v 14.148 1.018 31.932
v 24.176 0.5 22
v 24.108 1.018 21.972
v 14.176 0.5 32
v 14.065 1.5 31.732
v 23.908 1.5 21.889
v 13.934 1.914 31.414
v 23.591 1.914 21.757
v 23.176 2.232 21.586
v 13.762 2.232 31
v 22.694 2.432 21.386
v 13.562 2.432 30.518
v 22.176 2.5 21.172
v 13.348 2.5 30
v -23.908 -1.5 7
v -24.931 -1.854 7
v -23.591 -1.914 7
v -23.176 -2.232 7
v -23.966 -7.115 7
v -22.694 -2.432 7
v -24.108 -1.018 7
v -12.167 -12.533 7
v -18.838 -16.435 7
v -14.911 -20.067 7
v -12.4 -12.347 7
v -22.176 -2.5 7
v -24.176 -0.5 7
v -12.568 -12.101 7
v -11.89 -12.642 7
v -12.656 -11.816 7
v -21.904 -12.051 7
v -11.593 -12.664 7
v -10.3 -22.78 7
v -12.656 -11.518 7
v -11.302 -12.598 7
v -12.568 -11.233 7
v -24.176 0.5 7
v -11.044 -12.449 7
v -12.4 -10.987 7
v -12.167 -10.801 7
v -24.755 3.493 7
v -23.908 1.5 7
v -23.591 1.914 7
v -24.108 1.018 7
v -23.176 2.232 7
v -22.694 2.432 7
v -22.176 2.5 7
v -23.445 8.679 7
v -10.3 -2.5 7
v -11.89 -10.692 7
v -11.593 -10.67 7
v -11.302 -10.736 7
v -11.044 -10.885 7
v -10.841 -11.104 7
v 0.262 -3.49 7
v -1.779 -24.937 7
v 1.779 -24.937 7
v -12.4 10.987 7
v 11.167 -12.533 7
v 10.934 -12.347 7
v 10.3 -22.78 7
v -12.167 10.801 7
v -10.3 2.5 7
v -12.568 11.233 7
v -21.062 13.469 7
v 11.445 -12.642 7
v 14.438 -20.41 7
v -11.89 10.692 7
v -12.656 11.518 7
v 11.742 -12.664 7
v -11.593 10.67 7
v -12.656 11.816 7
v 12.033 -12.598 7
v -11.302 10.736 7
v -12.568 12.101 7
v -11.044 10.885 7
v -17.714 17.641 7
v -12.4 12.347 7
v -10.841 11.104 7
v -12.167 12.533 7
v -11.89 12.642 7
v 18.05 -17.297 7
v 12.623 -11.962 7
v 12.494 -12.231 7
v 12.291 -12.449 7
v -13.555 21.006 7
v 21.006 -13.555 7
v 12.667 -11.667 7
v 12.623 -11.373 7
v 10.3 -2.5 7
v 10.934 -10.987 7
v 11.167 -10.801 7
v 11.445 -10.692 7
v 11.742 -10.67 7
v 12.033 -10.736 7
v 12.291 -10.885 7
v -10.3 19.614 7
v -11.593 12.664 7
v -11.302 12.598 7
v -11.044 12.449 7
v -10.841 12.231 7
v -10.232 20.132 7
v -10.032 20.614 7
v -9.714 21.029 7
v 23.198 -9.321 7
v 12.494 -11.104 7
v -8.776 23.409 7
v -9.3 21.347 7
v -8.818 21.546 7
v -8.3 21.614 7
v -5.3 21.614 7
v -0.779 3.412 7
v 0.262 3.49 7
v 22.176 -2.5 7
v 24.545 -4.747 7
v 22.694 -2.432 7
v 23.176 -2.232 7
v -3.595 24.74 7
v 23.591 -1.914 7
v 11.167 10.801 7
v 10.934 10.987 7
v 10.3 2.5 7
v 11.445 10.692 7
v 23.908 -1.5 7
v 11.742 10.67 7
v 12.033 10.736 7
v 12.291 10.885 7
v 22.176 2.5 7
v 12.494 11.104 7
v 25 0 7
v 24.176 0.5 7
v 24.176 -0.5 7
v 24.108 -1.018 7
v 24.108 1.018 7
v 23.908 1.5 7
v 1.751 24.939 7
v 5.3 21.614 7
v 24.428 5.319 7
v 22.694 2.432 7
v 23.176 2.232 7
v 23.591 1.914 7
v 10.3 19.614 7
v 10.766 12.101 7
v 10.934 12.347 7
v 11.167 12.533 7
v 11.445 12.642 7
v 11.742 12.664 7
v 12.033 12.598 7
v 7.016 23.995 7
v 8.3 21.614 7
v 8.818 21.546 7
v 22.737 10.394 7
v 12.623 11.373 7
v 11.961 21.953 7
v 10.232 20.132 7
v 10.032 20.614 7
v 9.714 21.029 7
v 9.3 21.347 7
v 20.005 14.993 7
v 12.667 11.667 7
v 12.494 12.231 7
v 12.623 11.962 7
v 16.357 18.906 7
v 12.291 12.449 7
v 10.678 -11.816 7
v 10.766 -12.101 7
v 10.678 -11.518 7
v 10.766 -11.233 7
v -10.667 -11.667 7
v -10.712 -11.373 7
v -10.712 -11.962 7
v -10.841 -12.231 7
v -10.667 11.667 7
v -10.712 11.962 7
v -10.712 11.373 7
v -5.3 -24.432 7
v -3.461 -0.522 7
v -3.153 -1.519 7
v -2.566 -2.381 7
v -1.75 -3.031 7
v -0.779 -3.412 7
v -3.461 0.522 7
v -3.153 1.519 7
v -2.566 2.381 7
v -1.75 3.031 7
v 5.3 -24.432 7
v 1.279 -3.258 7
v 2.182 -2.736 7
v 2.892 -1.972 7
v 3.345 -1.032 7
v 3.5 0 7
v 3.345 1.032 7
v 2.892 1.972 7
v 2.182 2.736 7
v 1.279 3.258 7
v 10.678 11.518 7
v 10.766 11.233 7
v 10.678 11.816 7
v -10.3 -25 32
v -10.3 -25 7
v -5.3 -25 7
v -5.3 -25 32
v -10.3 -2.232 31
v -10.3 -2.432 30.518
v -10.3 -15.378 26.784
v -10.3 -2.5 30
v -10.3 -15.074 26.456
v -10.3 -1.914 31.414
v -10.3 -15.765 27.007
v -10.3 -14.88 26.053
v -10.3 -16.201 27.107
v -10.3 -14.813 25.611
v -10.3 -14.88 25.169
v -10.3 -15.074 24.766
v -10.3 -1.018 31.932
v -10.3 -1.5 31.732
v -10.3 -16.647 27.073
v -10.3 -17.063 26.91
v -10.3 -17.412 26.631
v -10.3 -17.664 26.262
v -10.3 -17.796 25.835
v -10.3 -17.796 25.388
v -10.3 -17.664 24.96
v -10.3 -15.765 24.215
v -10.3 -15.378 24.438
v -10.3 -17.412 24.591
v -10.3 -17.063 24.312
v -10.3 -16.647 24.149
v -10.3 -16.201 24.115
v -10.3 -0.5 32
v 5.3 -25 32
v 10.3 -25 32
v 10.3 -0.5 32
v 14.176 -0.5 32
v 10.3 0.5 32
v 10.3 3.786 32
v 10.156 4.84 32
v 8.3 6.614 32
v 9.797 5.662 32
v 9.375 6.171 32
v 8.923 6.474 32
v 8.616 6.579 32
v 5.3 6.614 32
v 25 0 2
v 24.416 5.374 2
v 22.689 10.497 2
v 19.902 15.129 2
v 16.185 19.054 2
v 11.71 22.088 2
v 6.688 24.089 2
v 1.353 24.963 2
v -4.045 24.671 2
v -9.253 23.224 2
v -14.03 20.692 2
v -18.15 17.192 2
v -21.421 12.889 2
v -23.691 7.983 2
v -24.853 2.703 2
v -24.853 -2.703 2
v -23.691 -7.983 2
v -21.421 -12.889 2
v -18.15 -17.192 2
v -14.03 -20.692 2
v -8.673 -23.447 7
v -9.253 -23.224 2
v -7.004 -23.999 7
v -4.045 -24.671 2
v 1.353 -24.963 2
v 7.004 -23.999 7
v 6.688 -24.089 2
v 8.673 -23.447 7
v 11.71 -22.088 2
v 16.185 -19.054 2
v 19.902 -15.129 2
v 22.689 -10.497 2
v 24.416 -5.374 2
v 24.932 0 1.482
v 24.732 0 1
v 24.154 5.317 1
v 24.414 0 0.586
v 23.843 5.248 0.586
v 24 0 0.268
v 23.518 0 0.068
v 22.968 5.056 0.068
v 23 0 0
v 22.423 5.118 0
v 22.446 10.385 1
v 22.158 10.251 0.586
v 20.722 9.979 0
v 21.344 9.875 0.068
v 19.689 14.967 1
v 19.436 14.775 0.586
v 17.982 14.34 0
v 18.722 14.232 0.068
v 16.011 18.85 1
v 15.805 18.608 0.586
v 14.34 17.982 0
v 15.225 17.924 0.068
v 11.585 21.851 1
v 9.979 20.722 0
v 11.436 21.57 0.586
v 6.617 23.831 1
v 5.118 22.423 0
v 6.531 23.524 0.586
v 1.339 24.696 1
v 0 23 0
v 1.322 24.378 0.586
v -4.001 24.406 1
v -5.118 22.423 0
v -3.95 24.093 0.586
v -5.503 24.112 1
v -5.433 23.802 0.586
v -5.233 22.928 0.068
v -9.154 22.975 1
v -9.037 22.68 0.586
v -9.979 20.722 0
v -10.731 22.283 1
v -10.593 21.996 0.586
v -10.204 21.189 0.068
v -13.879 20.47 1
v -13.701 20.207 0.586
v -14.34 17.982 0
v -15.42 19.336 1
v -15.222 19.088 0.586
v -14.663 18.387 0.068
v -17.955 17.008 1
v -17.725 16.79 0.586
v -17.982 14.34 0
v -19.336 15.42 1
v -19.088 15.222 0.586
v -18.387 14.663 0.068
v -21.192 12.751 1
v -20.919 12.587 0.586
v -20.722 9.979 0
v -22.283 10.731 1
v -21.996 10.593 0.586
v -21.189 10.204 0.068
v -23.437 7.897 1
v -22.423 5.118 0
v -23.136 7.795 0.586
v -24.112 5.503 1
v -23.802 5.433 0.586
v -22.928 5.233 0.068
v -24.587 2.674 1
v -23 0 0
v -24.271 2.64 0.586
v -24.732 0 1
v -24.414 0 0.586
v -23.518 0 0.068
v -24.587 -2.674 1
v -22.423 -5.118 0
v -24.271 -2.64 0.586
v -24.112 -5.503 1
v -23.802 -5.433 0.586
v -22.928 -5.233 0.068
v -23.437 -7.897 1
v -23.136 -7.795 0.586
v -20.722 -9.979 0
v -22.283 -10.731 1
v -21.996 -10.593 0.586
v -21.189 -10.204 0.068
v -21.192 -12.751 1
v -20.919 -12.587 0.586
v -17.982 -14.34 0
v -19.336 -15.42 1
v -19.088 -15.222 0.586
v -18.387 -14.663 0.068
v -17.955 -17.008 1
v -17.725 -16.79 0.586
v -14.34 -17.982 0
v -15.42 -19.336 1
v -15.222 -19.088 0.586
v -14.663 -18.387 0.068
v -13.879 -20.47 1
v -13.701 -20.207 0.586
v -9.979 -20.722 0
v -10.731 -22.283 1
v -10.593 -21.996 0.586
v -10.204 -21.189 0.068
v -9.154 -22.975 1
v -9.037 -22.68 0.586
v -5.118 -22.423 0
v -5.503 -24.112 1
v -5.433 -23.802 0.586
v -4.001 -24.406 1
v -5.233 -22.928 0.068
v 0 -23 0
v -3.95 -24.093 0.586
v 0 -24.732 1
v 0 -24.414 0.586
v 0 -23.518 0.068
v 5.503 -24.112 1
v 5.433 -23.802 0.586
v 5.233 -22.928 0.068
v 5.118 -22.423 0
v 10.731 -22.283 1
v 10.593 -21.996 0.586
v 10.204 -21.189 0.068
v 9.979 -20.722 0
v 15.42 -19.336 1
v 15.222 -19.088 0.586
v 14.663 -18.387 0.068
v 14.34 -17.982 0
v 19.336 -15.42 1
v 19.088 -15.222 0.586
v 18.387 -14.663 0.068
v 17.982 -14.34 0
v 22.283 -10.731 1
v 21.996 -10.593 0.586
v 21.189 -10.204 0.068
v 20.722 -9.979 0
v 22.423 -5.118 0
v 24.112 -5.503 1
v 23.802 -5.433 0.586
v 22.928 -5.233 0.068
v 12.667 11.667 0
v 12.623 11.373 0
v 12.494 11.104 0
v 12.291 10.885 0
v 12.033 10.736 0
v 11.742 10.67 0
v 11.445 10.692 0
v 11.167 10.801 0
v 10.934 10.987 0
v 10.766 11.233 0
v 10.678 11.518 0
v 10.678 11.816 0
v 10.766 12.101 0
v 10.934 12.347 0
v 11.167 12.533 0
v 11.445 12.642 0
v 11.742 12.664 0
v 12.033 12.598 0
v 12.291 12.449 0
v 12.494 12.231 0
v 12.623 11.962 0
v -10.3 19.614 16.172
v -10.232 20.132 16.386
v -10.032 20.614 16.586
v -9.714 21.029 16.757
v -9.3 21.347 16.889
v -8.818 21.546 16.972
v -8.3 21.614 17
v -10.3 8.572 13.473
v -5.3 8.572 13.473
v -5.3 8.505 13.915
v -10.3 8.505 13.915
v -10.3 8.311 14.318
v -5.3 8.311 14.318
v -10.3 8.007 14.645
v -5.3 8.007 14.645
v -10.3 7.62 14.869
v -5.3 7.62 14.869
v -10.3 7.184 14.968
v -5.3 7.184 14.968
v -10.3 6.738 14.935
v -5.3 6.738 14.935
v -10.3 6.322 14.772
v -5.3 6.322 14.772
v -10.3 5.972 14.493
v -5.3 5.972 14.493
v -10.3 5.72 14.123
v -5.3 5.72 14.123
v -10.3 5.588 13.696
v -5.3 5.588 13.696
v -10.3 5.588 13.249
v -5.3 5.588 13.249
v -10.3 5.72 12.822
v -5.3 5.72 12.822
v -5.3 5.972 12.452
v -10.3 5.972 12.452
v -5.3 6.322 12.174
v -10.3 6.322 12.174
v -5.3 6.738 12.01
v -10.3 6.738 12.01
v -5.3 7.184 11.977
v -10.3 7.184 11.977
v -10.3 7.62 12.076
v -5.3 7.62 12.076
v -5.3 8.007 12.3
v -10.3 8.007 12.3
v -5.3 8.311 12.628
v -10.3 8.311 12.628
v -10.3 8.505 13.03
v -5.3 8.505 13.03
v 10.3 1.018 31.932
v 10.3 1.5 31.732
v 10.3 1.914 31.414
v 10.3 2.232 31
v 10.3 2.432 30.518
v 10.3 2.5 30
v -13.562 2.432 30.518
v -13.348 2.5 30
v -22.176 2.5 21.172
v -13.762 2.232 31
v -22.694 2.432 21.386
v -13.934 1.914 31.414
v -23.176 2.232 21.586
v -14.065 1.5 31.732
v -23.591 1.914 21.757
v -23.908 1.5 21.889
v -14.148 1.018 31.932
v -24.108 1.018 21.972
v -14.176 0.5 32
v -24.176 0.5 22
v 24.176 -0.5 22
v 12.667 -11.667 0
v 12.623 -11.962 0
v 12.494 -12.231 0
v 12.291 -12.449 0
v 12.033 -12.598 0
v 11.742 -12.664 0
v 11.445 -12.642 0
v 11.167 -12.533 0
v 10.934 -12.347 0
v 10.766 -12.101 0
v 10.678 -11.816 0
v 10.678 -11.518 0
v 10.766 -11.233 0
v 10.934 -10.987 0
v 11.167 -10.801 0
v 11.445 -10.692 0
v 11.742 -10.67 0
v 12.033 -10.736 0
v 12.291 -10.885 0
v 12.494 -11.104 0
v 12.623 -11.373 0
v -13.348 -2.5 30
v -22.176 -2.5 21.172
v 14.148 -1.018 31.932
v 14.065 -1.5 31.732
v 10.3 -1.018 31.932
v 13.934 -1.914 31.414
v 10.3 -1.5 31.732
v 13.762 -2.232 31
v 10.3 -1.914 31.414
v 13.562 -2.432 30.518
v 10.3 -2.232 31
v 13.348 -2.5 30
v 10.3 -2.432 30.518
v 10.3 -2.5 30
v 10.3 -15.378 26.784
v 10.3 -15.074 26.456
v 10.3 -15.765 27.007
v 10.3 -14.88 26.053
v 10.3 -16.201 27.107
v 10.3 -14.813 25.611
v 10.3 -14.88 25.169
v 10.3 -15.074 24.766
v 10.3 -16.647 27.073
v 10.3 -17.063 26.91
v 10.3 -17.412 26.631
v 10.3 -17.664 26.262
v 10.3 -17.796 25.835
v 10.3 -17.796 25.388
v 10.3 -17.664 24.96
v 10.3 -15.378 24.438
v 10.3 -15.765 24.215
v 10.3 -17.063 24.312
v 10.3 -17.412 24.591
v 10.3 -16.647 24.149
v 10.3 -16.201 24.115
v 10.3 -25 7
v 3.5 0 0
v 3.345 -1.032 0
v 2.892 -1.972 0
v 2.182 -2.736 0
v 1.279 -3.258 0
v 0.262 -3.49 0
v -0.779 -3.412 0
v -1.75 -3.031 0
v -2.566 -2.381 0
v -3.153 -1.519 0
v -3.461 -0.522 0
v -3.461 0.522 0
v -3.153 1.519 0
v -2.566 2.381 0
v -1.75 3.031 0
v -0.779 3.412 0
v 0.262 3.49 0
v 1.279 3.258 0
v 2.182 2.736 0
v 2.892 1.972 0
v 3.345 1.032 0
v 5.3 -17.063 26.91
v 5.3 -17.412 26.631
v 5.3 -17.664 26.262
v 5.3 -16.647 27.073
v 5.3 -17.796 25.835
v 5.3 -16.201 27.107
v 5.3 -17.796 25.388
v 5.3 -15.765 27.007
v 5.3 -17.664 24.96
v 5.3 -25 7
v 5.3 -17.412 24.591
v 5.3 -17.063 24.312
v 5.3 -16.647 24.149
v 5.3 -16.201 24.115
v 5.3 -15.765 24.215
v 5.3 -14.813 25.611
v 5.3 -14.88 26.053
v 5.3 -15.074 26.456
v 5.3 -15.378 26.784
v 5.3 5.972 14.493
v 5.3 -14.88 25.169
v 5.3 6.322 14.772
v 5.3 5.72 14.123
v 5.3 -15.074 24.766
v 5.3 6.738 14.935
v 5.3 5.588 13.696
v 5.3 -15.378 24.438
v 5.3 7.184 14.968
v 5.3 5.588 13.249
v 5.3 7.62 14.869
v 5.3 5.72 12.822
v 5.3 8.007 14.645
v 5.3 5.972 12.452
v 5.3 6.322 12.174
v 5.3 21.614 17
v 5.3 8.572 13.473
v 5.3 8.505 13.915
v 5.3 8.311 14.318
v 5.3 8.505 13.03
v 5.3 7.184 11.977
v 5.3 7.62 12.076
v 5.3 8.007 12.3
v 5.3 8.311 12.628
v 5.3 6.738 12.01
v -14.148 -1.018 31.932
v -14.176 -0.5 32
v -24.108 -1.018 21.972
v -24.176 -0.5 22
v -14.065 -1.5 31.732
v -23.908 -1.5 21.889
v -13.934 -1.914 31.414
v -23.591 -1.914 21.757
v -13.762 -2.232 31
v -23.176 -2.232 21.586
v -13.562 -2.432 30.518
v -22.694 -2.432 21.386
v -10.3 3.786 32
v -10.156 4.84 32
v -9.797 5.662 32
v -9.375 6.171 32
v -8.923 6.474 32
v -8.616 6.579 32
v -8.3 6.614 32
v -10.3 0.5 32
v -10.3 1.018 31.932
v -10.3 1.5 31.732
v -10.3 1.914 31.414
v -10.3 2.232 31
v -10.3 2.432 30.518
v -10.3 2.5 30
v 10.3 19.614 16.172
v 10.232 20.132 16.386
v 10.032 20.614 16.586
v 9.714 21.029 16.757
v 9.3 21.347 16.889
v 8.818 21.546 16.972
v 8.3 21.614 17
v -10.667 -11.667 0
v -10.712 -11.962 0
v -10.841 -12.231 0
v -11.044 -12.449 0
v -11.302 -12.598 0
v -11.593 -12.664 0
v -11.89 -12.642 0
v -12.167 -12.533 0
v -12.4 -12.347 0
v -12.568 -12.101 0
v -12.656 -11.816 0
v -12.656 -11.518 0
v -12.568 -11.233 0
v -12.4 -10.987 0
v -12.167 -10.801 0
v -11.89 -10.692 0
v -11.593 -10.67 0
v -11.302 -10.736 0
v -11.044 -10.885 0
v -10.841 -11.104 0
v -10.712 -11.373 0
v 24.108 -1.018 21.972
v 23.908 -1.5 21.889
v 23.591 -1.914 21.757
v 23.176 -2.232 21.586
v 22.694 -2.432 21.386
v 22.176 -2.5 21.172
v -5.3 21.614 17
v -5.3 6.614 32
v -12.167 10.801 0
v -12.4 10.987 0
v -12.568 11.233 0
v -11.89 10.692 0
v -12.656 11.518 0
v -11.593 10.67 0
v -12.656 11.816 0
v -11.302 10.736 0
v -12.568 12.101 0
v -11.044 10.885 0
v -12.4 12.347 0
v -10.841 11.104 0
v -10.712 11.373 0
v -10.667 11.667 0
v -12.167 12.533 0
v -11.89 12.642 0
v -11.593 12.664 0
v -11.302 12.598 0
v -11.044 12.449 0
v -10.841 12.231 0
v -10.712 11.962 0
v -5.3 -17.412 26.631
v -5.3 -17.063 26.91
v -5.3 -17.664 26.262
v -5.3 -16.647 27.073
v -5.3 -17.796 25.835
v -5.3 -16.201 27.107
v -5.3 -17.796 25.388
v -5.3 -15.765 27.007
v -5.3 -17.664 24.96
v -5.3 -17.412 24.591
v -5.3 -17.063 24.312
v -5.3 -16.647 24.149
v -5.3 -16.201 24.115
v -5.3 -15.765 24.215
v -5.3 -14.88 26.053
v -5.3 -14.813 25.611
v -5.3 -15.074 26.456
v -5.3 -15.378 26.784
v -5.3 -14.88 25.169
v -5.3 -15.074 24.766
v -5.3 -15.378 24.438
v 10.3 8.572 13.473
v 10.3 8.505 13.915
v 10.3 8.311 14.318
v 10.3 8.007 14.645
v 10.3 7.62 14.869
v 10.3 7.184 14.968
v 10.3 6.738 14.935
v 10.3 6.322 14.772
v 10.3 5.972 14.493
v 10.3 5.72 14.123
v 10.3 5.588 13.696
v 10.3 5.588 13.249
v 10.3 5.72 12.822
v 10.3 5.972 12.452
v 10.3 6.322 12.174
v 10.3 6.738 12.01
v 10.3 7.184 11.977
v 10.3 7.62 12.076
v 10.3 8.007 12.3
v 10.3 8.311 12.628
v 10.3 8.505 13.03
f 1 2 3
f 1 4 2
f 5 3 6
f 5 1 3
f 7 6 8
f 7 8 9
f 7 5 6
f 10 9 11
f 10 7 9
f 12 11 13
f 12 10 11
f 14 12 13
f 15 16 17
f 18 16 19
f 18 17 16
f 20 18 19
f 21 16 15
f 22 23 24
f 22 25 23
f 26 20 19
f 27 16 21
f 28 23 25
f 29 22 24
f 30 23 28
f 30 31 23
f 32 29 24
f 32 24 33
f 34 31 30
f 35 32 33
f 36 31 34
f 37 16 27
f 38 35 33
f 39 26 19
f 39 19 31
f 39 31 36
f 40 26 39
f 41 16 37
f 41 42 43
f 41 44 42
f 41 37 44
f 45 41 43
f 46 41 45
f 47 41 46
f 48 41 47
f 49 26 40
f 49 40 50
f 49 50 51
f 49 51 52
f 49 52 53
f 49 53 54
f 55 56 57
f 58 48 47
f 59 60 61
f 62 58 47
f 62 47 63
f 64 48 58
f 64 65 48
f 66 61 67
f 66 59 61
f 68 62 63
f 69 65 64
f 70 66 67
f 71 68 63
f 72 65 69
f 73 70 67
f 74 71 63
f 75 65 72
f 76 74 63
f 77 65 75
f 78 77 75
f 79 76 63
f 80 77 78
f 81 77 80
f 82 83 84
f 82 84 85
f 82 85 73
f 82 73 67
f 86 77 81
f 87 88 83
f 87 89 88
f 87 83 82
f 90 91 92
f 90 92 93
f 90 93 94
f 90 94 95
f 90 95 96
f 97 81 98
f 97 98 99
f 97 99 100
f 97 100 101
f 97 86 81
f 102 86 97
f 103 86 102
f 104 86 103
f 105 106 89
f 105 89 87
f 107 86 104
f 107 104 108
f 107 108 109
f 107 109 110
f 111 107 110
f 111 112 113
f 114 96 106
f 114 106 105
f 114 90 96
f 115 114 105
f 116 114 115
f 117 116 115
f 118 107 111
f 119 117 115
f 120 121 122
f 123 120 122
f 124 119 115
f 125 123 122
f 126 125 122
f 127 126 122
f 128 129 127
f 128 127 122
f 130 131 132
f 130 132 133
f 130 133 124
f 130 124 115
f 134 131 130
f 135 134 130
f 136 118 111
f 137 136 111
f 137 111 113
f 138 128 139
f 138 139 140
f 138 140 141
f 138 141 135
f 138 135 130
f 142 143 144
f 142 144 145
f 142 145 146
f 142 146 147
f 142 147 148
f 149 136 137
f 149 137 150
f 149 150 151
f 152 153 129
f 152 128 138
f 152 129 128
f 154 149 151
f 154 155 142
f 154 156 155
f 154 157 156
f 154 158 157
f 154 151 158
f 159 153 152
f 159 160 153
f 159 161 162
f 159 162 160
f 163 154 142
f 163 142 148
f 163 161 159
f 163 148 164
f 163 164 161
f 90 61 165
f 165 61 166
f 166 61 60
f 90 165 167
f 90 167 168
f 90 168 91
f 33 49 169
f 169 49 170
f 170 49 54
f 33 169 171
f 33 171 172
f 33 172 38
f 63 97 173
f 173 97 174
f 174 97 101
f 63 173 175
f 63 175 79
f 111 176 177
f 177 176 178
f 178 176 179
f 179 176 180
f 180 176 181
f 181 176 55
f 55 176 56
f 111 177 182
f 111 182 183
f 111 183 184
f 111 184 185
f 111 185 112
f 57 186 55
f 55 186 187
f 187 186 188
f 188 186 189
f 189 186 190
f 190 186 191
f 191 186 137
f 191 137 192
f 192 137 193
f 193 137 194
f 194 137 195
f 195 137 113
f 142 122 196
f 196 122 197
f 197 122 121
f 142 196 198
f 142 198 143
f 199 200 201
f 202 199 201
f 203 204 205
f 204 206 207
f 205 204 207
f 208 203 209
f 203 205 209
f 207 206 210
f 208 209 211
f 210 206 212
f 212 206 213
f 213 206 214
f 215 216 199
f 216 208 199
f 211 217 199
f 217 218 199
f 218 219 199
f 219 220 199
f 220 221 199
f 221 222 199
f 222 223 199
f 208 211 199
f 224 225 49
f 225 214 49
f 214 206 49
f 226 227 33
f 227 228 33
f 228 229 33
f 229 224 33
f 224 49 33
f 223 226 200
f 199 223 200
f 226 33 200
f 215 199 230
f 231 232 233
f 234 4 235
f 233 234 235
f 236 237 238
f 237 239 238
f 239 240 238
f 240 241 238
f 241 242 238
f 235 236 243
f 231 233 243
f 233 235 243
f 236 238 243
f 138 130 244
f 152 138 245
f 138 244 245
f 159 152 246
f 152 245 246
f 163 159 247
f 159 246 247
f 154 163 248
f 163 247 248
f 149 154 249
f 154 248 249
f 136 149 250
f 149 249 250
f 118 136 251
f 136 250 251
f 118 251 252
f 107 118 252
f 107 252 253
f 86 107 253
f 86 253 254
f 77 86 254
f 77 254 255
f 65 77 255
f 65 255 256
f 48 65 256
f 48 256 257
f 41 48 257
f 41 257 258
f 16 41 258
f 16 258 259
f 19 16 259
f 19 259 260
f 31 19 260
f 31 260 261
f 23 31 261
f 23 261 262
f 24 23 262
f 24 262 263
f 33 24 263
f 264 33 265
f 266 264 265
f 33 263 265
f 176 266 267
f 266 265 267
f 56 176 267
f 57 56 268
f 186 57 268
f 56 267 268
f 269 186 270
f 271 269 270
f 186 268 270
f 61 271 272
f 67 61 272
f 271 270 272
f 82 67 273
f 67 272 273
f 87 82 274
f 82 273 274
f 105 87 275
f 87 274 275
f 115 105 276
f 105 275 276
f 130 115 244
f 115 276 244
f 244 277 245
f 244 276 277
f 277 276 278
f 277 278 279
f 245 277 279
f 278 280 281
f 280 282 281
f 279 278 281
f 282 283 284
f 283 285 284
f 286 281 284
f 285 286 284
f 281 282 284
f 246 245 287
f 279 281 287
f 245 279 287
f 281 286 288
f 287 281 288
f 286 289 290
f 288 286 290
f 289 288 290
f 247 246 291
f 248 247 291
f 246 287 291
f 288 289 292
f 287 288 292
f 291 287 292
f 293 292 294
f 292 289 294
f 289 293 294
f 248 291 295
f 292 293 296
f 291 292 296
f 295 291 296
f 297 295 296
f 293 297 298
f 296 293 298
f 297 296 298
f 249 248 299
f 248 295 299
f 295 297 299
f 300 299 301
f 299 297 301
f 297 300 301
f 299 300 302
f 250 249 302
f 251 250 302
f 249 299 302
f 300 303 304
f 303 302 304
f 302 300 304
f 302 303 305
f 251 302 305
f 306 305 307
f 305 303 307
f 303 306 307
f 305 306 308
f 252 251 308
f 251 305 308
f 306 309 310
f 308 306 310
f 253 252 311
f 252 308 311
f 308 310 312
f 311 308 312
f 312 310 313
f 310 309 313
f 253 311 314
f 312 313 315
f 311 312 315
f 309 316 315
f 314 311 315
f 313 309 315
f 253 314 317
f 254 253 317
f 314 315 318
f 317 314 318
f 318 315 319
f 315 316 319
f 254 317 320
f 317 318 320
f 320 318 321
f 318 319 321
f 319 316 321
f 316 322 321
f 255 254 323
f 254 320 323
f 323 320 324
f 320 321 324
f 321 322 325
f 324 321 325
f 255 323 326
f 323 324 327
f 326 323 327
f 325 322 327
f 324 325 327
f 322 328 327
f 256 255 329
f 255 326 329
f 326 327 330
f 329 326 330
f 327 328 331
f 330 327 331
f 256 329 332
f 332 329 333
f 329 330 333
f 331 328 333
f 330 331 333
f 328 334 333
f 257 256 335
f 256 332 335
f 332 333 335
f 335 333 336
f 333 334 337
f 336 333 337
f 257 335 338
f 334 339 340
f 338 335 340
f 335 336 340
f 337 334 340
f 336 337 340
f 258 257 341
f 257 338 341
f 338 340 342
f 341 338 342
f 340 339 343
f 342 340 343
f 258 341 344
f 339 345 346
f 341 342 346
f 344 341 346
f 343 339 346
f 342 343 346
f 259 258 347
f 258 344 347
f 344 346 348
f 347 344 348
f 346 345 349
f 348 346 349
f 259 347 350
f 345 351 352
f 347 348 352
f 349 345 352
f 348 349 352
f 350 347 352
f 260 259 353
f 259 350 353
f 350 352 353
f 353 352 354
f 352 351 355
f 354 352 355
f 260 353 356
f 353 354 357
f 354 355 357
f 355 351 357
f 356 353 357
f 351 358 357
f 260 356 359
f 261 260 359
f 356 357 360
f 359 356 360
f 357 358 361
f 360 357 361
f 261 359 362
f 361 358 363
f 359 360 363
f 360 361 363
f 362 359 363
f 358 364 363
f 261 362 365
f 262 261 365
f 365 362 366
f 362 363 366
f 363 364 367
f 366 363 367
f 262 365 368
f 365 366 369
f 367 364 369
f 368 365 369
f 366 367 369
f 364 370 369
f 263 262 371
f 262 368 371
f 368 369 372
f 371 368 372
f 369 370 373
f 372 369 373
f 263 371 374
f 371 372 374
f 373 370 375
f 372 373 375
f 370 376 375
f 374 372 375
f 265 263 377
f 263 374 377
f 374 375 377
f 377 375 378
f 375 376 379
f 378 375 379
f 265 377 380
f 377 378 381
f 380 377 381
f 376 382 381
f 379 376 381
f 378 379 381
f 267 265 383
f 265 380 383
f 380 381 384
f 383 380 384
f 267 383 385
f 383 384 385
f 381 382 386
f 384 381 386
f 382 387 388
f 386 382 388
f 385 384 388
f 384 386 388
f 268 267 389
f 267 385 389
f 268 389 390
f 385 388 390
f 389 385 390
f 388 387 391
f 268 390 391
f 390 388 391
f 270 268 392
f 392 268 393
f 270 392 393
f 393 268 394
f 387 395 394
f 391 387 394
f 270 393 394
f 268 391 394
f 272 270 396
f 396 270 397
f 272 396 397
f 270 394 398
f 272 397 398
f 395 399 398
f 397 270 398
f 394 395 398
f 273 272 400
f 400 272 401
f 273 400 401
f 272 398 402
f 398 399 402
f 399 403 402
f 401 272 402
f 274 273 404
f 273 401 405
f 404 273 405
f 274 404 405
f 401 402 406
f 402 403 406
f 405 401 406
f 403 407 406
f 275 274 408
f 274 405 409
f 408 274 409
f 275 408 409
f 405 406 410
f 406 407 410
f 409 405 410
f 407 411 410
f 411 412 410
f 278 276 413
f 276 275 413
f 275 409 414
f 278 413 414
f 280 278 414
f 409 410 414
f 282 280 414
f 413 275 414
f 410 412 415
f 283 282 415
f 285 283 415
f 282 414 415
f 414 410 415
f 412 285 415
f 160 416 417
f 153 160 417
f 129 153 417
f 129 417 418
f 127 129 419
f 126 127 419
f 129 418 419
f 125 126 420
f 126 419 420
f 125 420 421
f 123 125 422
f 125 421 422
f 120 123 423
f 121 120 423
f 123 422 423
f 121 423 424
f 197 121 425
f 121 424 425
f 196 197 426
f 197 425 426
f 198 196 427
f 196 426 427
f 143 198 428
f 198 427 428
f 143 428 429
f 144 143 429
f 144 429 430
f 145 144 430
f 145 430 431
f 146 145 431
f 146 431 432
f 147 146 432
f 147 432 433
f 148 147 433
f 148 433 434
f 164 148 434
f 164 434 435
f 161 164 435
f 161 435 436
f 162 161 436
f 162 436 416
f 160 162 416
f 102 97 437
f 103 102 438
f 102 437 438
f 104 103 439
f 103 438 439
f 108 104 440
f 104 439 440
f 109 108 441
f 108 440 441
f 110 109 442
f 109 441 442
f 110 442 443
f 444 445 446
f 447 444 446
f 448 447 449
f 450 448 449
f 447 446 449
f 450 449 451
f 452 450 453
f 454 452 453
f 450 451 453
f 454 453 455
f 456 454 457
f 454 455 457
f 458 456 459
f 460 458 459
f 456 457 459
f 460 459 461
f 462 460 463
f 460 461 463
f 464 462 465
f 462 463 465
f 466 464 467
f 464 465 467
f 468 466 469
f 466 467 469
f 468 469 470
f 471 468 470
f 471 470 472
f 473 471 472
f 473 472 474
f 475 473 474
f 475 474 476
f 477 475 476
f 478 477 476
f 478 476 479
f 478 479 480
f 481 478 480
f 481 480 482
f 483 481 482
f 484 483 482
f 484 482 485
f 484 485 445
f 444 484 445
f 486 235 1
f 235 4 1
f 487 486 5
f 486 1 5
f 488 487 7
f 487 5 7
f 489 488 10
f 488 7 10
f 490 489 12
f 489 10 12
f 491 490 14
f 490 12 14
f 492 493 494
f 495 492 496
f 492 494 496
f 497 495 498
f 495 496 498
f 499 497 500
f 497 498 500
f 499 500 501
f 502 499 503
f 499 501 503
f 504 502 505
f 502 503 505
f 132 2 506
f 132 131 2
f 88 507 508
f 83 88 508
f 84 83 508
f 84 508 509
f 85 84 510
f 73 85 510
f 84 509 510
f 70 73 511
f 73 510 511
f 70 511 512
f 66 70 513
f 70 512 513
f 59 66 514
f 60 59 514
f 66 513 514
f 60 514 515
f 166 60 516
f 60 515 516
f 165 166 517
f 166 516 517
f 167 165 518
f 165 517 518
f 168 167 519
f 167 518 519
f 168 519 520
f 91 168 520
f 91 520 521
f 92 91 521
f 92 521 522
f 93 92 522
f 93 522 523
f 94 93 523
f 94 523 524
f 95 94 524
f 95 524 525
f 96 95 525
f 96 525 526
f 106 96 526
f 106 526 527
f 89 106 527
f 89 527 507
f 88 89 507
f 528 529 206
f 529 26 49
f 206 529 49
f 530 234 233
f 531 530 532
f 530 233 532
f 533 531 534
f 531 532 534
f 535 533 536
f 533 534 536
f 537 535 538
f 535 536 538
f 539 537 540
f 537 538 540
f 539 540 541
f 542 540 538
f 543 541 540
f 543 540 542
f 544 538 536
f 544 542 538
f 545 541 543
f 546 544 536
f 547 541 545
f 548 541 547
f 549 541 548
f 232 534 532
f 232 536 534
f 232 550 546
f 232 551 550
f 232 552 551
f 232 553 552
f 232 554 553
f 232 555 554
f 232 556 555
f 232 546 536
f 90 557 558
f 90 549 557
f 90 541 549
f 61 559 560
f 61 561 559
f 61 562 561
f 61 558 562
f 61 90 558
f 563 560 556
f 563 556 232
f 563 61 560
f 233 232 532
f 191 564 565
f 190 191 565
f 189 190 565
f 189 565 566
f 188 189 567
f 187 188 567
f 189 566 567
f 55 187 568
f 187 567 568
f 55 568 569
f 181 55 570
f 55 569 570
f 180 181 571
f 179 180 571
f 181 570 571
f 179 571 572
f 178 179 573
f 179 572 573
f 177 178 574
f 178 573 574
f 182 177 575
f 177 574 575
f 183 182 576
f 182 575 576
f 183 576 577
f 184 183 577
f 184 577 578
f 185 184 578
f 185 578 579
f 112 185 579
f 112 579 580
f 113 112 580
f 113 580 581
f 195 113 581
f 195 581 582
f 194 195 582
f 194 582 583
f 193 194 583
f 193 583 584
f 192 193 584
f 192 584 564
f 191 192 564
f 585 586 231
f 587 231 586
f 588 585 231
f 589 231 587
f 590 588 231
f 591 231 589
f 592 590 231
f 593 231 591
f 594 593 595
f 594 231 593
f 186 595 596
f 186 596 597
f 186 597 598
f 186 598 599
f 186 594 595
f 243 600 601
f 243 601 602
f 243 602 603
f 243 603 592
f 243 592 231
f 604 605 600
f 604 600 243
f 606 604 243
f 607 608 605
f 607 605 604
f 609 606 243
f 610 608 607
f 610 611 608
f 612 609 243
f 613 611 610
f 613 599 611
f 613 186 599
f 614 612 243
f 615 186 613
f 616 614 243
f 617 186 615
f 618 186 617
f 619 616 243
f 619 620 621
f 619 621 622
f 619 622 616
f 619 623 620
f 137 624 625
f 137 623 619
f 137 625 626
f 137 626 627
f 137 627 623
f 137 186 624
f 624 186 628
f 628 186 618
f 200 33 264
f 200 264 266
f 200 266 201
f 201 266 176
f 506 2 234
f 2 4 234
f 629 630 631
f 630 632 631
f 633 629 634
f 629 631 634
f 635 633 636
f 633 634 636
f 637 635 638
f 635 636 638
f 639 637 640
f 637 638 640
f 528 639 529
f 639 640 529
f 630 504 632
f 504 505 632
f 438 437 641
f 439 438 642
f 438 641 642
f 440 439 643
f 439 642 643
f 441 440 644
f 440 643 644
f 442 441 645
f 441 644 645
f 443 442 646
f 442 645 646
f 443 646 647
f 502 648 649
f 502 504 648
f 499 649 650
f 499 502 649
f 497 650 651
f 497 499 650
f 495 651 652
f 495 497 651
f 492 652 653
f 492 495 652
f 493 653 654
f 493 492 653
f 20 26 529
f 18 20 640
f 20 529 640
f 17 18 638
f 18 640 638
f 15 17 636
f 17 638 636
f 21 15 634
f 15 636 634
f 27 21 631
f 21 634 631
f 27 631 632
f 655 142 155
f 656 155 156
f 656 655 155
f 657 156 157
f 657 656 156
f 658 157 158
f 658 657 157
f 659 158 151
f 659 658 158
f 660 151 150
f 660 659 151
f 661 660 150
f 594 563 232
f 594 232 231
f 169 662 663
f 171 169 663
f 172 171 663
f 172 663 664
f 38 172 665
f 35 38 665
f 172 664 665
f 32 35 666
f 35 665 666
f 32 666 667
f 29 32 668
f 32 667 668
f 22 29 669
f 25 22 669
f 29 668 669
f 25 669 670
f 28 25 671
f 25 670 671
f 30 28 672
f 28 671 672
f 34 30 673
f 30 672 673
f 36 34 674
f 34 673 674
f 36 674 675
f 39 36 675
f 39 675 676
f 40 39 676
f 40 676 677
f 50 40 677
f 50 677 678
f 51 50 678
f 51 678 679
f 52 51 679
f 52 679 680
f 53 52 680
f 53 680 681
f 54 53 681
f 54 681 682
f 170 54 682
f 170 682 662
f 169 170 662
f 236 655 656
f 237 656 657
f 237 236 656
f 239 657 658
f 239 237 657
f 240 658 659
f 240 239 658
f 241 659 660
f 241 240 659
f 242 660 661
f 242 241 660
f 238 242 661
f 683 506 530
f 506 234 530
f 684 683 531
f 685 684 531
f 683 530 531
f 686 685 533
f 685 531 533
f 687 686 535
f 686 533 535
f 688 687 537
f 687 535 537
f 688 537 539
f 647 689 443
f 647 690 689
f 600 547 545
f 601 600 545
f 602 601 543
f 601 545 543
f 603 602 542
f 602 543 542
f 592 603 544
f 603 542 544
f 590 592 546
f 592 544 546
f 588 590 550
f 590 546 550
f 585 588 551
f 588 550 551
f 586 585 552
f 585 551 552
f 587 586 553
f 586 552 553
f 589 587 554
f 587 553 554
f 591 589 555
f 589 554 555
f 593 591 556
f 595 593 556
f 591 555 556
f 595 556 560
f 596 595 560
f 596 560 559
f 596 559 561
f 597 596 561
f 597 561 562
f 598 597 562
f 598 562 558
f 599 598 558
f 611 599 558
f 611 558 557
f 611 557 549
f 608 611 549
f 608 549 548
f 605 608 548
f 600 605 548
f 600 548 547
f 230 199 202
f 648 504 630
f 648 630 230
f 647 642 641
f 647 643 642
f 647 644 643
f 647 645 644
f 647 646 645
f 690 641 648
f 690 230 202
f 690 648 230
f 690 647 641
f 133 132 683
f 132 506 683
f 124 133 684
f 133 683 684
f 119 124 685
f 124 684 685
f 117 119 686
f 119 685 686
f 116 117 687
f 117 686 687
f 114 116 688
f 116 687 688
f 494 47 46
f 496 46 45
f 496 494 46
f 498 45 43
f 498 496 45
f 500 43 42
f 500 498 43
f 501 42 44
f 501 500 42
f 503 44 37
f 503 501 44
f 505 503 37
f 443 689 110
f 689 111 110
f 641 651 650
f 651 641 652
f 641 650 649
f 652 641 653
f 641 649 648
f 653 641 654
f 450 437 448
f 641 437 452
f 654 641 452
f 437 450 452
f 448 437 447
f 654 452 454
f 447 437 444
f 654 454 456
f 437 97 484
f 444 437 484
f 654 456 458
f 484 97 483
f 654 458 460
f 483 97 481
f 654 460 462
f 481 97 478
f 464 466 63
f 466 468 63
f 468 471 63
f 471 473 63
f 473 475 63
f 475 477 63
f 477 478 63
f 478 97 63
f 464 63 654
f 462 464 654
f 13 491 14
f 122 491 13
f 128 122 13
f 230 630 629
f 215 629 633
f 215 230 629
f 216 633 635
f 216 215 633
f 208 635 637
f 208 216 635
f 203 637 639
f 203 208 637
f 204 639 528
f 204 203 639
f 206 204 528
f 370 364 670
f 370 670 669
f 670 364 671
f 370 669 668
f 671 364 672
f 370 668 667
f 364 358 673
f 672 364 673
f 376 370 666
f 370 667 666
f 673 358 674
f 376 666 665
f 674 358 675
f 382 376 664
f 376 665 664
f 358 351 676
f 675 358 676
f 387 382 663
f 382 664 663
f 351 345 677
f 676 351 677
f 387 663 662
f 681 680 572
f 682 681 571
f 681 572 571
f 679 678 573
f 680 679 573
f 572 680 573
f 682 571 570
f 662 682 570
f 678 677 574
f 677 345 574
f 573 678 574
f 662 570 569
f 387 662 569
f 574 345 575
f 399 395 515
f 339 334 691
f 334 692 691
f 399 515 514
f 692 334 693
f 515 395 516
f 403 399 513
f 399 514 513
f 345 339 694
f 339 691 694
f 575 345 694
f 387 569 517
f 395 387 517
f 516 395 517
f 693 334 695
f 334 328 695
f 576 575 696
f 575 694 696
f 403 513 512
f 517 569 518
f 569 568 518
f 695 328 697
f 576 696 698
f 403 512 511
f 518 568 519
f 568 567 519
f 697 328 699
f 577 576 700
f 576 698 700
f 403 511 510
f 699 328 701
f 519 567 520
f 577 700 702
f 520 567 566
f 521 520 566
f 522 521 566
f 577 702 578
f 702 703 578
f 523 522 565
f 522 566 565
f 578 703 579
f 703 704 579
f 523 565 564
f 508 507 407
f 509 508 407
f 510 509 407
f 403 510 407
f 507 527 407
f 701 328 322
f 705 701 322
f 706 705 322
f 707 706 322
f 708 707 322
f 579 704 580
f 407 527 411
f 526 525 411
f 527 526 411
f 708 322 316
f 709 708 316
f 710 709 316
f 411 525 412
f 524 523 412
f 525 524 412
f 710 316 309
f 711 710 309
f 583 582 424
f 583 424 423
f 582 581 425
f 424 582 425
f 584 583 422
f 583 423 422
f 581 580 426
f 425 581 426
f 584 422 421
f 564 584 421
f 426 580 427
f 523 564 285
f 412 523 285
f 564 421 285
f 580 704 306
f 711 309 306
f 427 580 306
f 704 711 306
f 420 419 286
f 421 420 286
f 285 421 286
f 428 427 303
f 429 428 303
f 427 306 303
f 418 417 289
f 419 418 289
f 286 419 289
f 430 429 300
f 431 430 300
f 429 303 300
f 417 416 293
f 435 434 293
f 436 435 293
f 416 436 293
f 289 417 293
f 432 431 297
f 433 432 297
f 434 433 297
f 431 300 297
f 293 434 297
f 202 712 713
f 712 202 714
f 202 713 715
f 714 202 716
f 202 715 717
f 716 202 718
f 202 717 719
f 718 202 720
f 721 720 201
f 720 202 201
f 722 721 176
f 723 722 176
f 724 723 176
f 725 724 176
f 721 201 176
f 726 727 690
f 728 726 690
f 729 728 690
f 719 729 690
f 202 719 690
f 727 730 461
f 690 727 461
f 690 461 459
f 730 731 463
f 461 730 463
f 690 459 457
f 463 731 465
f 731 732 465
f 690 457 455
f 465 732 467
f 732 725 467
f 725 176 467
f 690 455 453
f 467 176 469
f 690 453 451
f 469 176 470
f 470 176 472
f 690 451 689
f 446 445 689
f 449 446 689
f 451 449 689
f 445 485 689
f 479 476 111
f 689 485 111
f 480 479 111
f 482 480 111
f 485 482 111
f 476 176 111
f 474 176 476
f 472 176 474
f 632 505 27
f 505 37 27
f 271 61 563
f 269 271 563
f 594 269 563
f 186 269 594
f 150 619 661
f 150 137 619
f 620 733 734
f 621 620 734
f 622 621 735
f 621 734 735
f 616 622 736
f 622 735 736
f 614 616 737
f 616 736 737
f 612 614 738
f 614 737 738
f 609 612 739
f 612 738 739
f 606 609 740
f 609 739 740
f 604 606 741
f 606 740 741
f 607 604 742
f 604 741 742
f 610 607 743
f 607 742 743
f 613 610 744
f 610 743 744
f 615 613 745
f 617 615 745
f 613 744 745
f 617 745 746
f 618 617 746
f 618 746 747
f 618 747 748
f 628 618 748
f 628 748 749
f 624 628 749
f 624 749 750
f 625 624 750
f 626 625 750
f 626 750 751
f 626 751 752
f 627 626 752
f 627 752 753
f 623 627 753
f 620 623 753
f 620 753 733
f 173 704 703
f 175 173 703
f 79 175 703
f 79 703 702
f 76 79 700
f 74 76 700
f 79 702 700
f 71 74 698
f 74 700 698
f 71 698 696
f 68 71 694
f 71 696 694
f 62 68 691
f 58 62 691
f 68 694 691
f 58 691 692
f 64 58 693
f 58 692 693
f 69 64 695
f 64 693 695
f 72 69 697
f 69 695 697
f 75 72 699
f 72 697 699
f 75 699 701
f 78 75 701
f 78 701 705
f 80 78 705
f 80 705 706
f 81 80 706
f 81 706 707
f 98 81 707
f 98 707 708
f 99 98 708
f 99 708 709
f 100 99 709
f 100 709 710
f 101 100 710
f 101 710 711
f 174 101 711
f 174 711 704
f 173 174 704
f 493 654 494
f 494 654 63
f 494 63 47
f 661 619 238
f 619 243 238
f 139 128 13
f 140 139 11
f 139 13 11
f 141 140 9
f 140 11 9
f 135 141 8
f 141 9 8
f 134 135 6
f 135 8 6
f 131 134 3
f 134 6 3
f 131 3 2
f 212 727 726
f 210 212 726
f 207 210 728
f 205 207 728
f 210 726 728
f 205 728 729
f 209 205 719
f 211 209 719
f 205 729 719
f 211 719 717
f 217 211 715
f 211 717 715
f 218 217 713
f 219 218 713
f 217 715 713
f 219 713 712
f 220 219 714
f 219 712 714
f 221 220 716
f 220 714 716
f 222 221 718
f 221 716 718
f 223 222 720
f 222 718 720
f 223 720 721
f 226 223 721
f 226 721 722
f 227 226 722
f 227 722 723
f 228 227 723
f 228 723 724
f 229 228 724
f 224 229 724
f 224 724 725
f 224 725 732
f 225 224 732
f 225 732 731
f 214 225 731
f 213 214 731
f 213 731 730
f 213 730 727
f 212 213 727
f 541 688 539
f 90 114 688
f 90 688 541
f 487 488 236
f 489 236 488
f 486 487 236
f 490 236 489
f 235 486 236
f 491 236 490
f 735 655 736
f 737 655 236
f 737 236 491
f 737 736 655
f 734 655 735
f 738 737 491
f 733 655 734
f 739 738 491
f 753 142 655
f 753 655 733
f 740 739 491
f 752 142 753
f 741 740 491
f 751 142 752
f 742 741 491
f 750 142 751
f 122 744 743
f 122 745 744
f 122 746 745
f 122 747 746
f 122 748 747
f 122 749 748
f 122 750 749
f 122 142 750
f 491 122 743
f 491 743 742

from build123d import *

# Parameters (mm, degrees)
SKETCH_R        = 25
PAD_DEPTH       = 7
PAD001_DEPTH    = 25
CHAMFER_SIZE    = 15
CHAMFER001_SIZE = 10
FILLET_R        = 2
FILLET001_R     = 2
FILLET002_R     = 2
SKETCH002_R     = 1.5
POCKET_DEPTH    = 35.301
FILLET003_R     = 2
SKETCH003_R     = 1
POCKET001_DEPTH = 32.001
SKETCH004_R     = 3.5
POCKET002_DEPTH = 32.001


with BuildPart() as part:
    # Sketch → Pad (new body)
    with BuildSketch(Plane.XY):
        Circle(SKETCH_R)
    extrude(amount=PAD_DEPTH)

    # Sketch001 → Pad001 (new body)
    with BuildSketch(Plane.XY.offset(7)):
        Polygon((5.3, 21.614464), (10.3, 21.614464), (10.3, 2.5), (24.176399, 2.5), (24.176399, -2.5), (10.3, -2.5), (10.3, -25), (5.3, -25), align=None)
    pad001 = extrude(amount=PAD001_DEPTH)

    # Mirrored: Pad001 across Sketch001 V_Axis
    add(pad001.mirror(Plane(origin=(0, 0, 7), x_dir=(0, 0, 1), z_dir=(1, 0, 0))))

    # Chamfer
    chamfer_edges = [part.edges().sort_by_distance(p)[0] for p in [
        (7.8, 21.614464, 32),
        (-7.8, 21.614464, 32),
    ]]
    chamfer(chamfer_edges, length=CHAMFER_SIZE)

    # Chamfer001
    chamfer001_edges = [part.edges().sort_by_distance(p)[0] for p in [
        (24.176399, 0, 32),
        (-24.176399, 0, 32),
    ]]
    chamfer(chamfer001_edges, length=CHAMFER001_SIZE)

    # Fillet
    fillet_edges = [part.edges().sort_by_distance(p)[0] for p in [
        (10.3, 14.114464, 24.5),
        (10.3, 21.614464, 12),
        (-10.3, 14.114464, 24.5),
        (-10.3, 21.614464, 12),
    ]]
    fillet(fillet_edges, radius=FILLET_R)

    # Fillet001
    fillet001_edges = [part.edges().sort_by_distance(p)[0] for p in [
        (-19.176399, 2.5, 27),
        (-24.176399, 2.5, 14.5),
        (-19.176399, -2.5, 27),
        (-24.176399, -2.5, 14.5),
        (-12.2382, 2.5, 32),
        (-12.2382, -2.5, 32),
    ]]
    fillet(fillet001_edges, radius=FILLET001_R)

    # Fillet002
    fillet002_edges = [part.edges().sort_by_distance(p)[0] for p in [
        (12.2382, 2.5, 32),
        (19.176399, 2.5, 27),
        (24.176399, 2.5, 14.5),
        (24.176399, -2.5, 14.5),
        (19.176399, -2.5, 27),
        (12.2382, -2.5, 32),
    ]]
    fillet(fillet002_edges, radius=FILLET002_R)

    # Sketch002 → Pocket (cut, through all)
    with BuildSketch(Plane.YZ.offset(10.3)):
        with Locations((7.071707, 13.472552)):
            Circle(SKETCH002_R)
        with Locations((-16.31287, 25.611097)):
            Circle(SKETCH002_R)
    extrude(amount=-POCKET_DEPTH, mode=Mode.SUBTRACT)

    # Fillet003
    fillet003_edges = [part.edges().sort_by_distance(p)[0] for p in [
        (-25, 0, 0),
    ]]
    fillet(fillet003_edges, radius=FILLET003_R)

    # Sketch003 → Pocket001 (cut, through all)
    with BuildSketch(Plane(origin=(0, 0, 0), x_dir=(1, 0, 0), z_dir=(0, 0, -1))):
        with Locations((11.667262, 11.667262)):
            Circle(SKETCH003_R)
        with Locations((-11.667262, 11.667262)):
            Circle(SKETCH003_R)
        with Locations((11.667262, -11.667262)):
            Circle(SKETCH003_R)
        with Locations((-11.667262, -11.667262)):
            Circle(SKETCH003_R)
    extrude(amount=-POCKET001_DEPTH, mode=Mode.SUBTRACT)

    # Sketch004 → Pocket002 (cut, through all)
    with BuildSketch(Plane(origin=(0, 0, 0), x_dir=(1, 0, 0), z_dir=(0, 0, -1))):
        Circle(SKETCH004_R)
    extrude(amount=-POCKET002_DEPTH, mode=Mode.SUBTRACT)


solid = part.part
